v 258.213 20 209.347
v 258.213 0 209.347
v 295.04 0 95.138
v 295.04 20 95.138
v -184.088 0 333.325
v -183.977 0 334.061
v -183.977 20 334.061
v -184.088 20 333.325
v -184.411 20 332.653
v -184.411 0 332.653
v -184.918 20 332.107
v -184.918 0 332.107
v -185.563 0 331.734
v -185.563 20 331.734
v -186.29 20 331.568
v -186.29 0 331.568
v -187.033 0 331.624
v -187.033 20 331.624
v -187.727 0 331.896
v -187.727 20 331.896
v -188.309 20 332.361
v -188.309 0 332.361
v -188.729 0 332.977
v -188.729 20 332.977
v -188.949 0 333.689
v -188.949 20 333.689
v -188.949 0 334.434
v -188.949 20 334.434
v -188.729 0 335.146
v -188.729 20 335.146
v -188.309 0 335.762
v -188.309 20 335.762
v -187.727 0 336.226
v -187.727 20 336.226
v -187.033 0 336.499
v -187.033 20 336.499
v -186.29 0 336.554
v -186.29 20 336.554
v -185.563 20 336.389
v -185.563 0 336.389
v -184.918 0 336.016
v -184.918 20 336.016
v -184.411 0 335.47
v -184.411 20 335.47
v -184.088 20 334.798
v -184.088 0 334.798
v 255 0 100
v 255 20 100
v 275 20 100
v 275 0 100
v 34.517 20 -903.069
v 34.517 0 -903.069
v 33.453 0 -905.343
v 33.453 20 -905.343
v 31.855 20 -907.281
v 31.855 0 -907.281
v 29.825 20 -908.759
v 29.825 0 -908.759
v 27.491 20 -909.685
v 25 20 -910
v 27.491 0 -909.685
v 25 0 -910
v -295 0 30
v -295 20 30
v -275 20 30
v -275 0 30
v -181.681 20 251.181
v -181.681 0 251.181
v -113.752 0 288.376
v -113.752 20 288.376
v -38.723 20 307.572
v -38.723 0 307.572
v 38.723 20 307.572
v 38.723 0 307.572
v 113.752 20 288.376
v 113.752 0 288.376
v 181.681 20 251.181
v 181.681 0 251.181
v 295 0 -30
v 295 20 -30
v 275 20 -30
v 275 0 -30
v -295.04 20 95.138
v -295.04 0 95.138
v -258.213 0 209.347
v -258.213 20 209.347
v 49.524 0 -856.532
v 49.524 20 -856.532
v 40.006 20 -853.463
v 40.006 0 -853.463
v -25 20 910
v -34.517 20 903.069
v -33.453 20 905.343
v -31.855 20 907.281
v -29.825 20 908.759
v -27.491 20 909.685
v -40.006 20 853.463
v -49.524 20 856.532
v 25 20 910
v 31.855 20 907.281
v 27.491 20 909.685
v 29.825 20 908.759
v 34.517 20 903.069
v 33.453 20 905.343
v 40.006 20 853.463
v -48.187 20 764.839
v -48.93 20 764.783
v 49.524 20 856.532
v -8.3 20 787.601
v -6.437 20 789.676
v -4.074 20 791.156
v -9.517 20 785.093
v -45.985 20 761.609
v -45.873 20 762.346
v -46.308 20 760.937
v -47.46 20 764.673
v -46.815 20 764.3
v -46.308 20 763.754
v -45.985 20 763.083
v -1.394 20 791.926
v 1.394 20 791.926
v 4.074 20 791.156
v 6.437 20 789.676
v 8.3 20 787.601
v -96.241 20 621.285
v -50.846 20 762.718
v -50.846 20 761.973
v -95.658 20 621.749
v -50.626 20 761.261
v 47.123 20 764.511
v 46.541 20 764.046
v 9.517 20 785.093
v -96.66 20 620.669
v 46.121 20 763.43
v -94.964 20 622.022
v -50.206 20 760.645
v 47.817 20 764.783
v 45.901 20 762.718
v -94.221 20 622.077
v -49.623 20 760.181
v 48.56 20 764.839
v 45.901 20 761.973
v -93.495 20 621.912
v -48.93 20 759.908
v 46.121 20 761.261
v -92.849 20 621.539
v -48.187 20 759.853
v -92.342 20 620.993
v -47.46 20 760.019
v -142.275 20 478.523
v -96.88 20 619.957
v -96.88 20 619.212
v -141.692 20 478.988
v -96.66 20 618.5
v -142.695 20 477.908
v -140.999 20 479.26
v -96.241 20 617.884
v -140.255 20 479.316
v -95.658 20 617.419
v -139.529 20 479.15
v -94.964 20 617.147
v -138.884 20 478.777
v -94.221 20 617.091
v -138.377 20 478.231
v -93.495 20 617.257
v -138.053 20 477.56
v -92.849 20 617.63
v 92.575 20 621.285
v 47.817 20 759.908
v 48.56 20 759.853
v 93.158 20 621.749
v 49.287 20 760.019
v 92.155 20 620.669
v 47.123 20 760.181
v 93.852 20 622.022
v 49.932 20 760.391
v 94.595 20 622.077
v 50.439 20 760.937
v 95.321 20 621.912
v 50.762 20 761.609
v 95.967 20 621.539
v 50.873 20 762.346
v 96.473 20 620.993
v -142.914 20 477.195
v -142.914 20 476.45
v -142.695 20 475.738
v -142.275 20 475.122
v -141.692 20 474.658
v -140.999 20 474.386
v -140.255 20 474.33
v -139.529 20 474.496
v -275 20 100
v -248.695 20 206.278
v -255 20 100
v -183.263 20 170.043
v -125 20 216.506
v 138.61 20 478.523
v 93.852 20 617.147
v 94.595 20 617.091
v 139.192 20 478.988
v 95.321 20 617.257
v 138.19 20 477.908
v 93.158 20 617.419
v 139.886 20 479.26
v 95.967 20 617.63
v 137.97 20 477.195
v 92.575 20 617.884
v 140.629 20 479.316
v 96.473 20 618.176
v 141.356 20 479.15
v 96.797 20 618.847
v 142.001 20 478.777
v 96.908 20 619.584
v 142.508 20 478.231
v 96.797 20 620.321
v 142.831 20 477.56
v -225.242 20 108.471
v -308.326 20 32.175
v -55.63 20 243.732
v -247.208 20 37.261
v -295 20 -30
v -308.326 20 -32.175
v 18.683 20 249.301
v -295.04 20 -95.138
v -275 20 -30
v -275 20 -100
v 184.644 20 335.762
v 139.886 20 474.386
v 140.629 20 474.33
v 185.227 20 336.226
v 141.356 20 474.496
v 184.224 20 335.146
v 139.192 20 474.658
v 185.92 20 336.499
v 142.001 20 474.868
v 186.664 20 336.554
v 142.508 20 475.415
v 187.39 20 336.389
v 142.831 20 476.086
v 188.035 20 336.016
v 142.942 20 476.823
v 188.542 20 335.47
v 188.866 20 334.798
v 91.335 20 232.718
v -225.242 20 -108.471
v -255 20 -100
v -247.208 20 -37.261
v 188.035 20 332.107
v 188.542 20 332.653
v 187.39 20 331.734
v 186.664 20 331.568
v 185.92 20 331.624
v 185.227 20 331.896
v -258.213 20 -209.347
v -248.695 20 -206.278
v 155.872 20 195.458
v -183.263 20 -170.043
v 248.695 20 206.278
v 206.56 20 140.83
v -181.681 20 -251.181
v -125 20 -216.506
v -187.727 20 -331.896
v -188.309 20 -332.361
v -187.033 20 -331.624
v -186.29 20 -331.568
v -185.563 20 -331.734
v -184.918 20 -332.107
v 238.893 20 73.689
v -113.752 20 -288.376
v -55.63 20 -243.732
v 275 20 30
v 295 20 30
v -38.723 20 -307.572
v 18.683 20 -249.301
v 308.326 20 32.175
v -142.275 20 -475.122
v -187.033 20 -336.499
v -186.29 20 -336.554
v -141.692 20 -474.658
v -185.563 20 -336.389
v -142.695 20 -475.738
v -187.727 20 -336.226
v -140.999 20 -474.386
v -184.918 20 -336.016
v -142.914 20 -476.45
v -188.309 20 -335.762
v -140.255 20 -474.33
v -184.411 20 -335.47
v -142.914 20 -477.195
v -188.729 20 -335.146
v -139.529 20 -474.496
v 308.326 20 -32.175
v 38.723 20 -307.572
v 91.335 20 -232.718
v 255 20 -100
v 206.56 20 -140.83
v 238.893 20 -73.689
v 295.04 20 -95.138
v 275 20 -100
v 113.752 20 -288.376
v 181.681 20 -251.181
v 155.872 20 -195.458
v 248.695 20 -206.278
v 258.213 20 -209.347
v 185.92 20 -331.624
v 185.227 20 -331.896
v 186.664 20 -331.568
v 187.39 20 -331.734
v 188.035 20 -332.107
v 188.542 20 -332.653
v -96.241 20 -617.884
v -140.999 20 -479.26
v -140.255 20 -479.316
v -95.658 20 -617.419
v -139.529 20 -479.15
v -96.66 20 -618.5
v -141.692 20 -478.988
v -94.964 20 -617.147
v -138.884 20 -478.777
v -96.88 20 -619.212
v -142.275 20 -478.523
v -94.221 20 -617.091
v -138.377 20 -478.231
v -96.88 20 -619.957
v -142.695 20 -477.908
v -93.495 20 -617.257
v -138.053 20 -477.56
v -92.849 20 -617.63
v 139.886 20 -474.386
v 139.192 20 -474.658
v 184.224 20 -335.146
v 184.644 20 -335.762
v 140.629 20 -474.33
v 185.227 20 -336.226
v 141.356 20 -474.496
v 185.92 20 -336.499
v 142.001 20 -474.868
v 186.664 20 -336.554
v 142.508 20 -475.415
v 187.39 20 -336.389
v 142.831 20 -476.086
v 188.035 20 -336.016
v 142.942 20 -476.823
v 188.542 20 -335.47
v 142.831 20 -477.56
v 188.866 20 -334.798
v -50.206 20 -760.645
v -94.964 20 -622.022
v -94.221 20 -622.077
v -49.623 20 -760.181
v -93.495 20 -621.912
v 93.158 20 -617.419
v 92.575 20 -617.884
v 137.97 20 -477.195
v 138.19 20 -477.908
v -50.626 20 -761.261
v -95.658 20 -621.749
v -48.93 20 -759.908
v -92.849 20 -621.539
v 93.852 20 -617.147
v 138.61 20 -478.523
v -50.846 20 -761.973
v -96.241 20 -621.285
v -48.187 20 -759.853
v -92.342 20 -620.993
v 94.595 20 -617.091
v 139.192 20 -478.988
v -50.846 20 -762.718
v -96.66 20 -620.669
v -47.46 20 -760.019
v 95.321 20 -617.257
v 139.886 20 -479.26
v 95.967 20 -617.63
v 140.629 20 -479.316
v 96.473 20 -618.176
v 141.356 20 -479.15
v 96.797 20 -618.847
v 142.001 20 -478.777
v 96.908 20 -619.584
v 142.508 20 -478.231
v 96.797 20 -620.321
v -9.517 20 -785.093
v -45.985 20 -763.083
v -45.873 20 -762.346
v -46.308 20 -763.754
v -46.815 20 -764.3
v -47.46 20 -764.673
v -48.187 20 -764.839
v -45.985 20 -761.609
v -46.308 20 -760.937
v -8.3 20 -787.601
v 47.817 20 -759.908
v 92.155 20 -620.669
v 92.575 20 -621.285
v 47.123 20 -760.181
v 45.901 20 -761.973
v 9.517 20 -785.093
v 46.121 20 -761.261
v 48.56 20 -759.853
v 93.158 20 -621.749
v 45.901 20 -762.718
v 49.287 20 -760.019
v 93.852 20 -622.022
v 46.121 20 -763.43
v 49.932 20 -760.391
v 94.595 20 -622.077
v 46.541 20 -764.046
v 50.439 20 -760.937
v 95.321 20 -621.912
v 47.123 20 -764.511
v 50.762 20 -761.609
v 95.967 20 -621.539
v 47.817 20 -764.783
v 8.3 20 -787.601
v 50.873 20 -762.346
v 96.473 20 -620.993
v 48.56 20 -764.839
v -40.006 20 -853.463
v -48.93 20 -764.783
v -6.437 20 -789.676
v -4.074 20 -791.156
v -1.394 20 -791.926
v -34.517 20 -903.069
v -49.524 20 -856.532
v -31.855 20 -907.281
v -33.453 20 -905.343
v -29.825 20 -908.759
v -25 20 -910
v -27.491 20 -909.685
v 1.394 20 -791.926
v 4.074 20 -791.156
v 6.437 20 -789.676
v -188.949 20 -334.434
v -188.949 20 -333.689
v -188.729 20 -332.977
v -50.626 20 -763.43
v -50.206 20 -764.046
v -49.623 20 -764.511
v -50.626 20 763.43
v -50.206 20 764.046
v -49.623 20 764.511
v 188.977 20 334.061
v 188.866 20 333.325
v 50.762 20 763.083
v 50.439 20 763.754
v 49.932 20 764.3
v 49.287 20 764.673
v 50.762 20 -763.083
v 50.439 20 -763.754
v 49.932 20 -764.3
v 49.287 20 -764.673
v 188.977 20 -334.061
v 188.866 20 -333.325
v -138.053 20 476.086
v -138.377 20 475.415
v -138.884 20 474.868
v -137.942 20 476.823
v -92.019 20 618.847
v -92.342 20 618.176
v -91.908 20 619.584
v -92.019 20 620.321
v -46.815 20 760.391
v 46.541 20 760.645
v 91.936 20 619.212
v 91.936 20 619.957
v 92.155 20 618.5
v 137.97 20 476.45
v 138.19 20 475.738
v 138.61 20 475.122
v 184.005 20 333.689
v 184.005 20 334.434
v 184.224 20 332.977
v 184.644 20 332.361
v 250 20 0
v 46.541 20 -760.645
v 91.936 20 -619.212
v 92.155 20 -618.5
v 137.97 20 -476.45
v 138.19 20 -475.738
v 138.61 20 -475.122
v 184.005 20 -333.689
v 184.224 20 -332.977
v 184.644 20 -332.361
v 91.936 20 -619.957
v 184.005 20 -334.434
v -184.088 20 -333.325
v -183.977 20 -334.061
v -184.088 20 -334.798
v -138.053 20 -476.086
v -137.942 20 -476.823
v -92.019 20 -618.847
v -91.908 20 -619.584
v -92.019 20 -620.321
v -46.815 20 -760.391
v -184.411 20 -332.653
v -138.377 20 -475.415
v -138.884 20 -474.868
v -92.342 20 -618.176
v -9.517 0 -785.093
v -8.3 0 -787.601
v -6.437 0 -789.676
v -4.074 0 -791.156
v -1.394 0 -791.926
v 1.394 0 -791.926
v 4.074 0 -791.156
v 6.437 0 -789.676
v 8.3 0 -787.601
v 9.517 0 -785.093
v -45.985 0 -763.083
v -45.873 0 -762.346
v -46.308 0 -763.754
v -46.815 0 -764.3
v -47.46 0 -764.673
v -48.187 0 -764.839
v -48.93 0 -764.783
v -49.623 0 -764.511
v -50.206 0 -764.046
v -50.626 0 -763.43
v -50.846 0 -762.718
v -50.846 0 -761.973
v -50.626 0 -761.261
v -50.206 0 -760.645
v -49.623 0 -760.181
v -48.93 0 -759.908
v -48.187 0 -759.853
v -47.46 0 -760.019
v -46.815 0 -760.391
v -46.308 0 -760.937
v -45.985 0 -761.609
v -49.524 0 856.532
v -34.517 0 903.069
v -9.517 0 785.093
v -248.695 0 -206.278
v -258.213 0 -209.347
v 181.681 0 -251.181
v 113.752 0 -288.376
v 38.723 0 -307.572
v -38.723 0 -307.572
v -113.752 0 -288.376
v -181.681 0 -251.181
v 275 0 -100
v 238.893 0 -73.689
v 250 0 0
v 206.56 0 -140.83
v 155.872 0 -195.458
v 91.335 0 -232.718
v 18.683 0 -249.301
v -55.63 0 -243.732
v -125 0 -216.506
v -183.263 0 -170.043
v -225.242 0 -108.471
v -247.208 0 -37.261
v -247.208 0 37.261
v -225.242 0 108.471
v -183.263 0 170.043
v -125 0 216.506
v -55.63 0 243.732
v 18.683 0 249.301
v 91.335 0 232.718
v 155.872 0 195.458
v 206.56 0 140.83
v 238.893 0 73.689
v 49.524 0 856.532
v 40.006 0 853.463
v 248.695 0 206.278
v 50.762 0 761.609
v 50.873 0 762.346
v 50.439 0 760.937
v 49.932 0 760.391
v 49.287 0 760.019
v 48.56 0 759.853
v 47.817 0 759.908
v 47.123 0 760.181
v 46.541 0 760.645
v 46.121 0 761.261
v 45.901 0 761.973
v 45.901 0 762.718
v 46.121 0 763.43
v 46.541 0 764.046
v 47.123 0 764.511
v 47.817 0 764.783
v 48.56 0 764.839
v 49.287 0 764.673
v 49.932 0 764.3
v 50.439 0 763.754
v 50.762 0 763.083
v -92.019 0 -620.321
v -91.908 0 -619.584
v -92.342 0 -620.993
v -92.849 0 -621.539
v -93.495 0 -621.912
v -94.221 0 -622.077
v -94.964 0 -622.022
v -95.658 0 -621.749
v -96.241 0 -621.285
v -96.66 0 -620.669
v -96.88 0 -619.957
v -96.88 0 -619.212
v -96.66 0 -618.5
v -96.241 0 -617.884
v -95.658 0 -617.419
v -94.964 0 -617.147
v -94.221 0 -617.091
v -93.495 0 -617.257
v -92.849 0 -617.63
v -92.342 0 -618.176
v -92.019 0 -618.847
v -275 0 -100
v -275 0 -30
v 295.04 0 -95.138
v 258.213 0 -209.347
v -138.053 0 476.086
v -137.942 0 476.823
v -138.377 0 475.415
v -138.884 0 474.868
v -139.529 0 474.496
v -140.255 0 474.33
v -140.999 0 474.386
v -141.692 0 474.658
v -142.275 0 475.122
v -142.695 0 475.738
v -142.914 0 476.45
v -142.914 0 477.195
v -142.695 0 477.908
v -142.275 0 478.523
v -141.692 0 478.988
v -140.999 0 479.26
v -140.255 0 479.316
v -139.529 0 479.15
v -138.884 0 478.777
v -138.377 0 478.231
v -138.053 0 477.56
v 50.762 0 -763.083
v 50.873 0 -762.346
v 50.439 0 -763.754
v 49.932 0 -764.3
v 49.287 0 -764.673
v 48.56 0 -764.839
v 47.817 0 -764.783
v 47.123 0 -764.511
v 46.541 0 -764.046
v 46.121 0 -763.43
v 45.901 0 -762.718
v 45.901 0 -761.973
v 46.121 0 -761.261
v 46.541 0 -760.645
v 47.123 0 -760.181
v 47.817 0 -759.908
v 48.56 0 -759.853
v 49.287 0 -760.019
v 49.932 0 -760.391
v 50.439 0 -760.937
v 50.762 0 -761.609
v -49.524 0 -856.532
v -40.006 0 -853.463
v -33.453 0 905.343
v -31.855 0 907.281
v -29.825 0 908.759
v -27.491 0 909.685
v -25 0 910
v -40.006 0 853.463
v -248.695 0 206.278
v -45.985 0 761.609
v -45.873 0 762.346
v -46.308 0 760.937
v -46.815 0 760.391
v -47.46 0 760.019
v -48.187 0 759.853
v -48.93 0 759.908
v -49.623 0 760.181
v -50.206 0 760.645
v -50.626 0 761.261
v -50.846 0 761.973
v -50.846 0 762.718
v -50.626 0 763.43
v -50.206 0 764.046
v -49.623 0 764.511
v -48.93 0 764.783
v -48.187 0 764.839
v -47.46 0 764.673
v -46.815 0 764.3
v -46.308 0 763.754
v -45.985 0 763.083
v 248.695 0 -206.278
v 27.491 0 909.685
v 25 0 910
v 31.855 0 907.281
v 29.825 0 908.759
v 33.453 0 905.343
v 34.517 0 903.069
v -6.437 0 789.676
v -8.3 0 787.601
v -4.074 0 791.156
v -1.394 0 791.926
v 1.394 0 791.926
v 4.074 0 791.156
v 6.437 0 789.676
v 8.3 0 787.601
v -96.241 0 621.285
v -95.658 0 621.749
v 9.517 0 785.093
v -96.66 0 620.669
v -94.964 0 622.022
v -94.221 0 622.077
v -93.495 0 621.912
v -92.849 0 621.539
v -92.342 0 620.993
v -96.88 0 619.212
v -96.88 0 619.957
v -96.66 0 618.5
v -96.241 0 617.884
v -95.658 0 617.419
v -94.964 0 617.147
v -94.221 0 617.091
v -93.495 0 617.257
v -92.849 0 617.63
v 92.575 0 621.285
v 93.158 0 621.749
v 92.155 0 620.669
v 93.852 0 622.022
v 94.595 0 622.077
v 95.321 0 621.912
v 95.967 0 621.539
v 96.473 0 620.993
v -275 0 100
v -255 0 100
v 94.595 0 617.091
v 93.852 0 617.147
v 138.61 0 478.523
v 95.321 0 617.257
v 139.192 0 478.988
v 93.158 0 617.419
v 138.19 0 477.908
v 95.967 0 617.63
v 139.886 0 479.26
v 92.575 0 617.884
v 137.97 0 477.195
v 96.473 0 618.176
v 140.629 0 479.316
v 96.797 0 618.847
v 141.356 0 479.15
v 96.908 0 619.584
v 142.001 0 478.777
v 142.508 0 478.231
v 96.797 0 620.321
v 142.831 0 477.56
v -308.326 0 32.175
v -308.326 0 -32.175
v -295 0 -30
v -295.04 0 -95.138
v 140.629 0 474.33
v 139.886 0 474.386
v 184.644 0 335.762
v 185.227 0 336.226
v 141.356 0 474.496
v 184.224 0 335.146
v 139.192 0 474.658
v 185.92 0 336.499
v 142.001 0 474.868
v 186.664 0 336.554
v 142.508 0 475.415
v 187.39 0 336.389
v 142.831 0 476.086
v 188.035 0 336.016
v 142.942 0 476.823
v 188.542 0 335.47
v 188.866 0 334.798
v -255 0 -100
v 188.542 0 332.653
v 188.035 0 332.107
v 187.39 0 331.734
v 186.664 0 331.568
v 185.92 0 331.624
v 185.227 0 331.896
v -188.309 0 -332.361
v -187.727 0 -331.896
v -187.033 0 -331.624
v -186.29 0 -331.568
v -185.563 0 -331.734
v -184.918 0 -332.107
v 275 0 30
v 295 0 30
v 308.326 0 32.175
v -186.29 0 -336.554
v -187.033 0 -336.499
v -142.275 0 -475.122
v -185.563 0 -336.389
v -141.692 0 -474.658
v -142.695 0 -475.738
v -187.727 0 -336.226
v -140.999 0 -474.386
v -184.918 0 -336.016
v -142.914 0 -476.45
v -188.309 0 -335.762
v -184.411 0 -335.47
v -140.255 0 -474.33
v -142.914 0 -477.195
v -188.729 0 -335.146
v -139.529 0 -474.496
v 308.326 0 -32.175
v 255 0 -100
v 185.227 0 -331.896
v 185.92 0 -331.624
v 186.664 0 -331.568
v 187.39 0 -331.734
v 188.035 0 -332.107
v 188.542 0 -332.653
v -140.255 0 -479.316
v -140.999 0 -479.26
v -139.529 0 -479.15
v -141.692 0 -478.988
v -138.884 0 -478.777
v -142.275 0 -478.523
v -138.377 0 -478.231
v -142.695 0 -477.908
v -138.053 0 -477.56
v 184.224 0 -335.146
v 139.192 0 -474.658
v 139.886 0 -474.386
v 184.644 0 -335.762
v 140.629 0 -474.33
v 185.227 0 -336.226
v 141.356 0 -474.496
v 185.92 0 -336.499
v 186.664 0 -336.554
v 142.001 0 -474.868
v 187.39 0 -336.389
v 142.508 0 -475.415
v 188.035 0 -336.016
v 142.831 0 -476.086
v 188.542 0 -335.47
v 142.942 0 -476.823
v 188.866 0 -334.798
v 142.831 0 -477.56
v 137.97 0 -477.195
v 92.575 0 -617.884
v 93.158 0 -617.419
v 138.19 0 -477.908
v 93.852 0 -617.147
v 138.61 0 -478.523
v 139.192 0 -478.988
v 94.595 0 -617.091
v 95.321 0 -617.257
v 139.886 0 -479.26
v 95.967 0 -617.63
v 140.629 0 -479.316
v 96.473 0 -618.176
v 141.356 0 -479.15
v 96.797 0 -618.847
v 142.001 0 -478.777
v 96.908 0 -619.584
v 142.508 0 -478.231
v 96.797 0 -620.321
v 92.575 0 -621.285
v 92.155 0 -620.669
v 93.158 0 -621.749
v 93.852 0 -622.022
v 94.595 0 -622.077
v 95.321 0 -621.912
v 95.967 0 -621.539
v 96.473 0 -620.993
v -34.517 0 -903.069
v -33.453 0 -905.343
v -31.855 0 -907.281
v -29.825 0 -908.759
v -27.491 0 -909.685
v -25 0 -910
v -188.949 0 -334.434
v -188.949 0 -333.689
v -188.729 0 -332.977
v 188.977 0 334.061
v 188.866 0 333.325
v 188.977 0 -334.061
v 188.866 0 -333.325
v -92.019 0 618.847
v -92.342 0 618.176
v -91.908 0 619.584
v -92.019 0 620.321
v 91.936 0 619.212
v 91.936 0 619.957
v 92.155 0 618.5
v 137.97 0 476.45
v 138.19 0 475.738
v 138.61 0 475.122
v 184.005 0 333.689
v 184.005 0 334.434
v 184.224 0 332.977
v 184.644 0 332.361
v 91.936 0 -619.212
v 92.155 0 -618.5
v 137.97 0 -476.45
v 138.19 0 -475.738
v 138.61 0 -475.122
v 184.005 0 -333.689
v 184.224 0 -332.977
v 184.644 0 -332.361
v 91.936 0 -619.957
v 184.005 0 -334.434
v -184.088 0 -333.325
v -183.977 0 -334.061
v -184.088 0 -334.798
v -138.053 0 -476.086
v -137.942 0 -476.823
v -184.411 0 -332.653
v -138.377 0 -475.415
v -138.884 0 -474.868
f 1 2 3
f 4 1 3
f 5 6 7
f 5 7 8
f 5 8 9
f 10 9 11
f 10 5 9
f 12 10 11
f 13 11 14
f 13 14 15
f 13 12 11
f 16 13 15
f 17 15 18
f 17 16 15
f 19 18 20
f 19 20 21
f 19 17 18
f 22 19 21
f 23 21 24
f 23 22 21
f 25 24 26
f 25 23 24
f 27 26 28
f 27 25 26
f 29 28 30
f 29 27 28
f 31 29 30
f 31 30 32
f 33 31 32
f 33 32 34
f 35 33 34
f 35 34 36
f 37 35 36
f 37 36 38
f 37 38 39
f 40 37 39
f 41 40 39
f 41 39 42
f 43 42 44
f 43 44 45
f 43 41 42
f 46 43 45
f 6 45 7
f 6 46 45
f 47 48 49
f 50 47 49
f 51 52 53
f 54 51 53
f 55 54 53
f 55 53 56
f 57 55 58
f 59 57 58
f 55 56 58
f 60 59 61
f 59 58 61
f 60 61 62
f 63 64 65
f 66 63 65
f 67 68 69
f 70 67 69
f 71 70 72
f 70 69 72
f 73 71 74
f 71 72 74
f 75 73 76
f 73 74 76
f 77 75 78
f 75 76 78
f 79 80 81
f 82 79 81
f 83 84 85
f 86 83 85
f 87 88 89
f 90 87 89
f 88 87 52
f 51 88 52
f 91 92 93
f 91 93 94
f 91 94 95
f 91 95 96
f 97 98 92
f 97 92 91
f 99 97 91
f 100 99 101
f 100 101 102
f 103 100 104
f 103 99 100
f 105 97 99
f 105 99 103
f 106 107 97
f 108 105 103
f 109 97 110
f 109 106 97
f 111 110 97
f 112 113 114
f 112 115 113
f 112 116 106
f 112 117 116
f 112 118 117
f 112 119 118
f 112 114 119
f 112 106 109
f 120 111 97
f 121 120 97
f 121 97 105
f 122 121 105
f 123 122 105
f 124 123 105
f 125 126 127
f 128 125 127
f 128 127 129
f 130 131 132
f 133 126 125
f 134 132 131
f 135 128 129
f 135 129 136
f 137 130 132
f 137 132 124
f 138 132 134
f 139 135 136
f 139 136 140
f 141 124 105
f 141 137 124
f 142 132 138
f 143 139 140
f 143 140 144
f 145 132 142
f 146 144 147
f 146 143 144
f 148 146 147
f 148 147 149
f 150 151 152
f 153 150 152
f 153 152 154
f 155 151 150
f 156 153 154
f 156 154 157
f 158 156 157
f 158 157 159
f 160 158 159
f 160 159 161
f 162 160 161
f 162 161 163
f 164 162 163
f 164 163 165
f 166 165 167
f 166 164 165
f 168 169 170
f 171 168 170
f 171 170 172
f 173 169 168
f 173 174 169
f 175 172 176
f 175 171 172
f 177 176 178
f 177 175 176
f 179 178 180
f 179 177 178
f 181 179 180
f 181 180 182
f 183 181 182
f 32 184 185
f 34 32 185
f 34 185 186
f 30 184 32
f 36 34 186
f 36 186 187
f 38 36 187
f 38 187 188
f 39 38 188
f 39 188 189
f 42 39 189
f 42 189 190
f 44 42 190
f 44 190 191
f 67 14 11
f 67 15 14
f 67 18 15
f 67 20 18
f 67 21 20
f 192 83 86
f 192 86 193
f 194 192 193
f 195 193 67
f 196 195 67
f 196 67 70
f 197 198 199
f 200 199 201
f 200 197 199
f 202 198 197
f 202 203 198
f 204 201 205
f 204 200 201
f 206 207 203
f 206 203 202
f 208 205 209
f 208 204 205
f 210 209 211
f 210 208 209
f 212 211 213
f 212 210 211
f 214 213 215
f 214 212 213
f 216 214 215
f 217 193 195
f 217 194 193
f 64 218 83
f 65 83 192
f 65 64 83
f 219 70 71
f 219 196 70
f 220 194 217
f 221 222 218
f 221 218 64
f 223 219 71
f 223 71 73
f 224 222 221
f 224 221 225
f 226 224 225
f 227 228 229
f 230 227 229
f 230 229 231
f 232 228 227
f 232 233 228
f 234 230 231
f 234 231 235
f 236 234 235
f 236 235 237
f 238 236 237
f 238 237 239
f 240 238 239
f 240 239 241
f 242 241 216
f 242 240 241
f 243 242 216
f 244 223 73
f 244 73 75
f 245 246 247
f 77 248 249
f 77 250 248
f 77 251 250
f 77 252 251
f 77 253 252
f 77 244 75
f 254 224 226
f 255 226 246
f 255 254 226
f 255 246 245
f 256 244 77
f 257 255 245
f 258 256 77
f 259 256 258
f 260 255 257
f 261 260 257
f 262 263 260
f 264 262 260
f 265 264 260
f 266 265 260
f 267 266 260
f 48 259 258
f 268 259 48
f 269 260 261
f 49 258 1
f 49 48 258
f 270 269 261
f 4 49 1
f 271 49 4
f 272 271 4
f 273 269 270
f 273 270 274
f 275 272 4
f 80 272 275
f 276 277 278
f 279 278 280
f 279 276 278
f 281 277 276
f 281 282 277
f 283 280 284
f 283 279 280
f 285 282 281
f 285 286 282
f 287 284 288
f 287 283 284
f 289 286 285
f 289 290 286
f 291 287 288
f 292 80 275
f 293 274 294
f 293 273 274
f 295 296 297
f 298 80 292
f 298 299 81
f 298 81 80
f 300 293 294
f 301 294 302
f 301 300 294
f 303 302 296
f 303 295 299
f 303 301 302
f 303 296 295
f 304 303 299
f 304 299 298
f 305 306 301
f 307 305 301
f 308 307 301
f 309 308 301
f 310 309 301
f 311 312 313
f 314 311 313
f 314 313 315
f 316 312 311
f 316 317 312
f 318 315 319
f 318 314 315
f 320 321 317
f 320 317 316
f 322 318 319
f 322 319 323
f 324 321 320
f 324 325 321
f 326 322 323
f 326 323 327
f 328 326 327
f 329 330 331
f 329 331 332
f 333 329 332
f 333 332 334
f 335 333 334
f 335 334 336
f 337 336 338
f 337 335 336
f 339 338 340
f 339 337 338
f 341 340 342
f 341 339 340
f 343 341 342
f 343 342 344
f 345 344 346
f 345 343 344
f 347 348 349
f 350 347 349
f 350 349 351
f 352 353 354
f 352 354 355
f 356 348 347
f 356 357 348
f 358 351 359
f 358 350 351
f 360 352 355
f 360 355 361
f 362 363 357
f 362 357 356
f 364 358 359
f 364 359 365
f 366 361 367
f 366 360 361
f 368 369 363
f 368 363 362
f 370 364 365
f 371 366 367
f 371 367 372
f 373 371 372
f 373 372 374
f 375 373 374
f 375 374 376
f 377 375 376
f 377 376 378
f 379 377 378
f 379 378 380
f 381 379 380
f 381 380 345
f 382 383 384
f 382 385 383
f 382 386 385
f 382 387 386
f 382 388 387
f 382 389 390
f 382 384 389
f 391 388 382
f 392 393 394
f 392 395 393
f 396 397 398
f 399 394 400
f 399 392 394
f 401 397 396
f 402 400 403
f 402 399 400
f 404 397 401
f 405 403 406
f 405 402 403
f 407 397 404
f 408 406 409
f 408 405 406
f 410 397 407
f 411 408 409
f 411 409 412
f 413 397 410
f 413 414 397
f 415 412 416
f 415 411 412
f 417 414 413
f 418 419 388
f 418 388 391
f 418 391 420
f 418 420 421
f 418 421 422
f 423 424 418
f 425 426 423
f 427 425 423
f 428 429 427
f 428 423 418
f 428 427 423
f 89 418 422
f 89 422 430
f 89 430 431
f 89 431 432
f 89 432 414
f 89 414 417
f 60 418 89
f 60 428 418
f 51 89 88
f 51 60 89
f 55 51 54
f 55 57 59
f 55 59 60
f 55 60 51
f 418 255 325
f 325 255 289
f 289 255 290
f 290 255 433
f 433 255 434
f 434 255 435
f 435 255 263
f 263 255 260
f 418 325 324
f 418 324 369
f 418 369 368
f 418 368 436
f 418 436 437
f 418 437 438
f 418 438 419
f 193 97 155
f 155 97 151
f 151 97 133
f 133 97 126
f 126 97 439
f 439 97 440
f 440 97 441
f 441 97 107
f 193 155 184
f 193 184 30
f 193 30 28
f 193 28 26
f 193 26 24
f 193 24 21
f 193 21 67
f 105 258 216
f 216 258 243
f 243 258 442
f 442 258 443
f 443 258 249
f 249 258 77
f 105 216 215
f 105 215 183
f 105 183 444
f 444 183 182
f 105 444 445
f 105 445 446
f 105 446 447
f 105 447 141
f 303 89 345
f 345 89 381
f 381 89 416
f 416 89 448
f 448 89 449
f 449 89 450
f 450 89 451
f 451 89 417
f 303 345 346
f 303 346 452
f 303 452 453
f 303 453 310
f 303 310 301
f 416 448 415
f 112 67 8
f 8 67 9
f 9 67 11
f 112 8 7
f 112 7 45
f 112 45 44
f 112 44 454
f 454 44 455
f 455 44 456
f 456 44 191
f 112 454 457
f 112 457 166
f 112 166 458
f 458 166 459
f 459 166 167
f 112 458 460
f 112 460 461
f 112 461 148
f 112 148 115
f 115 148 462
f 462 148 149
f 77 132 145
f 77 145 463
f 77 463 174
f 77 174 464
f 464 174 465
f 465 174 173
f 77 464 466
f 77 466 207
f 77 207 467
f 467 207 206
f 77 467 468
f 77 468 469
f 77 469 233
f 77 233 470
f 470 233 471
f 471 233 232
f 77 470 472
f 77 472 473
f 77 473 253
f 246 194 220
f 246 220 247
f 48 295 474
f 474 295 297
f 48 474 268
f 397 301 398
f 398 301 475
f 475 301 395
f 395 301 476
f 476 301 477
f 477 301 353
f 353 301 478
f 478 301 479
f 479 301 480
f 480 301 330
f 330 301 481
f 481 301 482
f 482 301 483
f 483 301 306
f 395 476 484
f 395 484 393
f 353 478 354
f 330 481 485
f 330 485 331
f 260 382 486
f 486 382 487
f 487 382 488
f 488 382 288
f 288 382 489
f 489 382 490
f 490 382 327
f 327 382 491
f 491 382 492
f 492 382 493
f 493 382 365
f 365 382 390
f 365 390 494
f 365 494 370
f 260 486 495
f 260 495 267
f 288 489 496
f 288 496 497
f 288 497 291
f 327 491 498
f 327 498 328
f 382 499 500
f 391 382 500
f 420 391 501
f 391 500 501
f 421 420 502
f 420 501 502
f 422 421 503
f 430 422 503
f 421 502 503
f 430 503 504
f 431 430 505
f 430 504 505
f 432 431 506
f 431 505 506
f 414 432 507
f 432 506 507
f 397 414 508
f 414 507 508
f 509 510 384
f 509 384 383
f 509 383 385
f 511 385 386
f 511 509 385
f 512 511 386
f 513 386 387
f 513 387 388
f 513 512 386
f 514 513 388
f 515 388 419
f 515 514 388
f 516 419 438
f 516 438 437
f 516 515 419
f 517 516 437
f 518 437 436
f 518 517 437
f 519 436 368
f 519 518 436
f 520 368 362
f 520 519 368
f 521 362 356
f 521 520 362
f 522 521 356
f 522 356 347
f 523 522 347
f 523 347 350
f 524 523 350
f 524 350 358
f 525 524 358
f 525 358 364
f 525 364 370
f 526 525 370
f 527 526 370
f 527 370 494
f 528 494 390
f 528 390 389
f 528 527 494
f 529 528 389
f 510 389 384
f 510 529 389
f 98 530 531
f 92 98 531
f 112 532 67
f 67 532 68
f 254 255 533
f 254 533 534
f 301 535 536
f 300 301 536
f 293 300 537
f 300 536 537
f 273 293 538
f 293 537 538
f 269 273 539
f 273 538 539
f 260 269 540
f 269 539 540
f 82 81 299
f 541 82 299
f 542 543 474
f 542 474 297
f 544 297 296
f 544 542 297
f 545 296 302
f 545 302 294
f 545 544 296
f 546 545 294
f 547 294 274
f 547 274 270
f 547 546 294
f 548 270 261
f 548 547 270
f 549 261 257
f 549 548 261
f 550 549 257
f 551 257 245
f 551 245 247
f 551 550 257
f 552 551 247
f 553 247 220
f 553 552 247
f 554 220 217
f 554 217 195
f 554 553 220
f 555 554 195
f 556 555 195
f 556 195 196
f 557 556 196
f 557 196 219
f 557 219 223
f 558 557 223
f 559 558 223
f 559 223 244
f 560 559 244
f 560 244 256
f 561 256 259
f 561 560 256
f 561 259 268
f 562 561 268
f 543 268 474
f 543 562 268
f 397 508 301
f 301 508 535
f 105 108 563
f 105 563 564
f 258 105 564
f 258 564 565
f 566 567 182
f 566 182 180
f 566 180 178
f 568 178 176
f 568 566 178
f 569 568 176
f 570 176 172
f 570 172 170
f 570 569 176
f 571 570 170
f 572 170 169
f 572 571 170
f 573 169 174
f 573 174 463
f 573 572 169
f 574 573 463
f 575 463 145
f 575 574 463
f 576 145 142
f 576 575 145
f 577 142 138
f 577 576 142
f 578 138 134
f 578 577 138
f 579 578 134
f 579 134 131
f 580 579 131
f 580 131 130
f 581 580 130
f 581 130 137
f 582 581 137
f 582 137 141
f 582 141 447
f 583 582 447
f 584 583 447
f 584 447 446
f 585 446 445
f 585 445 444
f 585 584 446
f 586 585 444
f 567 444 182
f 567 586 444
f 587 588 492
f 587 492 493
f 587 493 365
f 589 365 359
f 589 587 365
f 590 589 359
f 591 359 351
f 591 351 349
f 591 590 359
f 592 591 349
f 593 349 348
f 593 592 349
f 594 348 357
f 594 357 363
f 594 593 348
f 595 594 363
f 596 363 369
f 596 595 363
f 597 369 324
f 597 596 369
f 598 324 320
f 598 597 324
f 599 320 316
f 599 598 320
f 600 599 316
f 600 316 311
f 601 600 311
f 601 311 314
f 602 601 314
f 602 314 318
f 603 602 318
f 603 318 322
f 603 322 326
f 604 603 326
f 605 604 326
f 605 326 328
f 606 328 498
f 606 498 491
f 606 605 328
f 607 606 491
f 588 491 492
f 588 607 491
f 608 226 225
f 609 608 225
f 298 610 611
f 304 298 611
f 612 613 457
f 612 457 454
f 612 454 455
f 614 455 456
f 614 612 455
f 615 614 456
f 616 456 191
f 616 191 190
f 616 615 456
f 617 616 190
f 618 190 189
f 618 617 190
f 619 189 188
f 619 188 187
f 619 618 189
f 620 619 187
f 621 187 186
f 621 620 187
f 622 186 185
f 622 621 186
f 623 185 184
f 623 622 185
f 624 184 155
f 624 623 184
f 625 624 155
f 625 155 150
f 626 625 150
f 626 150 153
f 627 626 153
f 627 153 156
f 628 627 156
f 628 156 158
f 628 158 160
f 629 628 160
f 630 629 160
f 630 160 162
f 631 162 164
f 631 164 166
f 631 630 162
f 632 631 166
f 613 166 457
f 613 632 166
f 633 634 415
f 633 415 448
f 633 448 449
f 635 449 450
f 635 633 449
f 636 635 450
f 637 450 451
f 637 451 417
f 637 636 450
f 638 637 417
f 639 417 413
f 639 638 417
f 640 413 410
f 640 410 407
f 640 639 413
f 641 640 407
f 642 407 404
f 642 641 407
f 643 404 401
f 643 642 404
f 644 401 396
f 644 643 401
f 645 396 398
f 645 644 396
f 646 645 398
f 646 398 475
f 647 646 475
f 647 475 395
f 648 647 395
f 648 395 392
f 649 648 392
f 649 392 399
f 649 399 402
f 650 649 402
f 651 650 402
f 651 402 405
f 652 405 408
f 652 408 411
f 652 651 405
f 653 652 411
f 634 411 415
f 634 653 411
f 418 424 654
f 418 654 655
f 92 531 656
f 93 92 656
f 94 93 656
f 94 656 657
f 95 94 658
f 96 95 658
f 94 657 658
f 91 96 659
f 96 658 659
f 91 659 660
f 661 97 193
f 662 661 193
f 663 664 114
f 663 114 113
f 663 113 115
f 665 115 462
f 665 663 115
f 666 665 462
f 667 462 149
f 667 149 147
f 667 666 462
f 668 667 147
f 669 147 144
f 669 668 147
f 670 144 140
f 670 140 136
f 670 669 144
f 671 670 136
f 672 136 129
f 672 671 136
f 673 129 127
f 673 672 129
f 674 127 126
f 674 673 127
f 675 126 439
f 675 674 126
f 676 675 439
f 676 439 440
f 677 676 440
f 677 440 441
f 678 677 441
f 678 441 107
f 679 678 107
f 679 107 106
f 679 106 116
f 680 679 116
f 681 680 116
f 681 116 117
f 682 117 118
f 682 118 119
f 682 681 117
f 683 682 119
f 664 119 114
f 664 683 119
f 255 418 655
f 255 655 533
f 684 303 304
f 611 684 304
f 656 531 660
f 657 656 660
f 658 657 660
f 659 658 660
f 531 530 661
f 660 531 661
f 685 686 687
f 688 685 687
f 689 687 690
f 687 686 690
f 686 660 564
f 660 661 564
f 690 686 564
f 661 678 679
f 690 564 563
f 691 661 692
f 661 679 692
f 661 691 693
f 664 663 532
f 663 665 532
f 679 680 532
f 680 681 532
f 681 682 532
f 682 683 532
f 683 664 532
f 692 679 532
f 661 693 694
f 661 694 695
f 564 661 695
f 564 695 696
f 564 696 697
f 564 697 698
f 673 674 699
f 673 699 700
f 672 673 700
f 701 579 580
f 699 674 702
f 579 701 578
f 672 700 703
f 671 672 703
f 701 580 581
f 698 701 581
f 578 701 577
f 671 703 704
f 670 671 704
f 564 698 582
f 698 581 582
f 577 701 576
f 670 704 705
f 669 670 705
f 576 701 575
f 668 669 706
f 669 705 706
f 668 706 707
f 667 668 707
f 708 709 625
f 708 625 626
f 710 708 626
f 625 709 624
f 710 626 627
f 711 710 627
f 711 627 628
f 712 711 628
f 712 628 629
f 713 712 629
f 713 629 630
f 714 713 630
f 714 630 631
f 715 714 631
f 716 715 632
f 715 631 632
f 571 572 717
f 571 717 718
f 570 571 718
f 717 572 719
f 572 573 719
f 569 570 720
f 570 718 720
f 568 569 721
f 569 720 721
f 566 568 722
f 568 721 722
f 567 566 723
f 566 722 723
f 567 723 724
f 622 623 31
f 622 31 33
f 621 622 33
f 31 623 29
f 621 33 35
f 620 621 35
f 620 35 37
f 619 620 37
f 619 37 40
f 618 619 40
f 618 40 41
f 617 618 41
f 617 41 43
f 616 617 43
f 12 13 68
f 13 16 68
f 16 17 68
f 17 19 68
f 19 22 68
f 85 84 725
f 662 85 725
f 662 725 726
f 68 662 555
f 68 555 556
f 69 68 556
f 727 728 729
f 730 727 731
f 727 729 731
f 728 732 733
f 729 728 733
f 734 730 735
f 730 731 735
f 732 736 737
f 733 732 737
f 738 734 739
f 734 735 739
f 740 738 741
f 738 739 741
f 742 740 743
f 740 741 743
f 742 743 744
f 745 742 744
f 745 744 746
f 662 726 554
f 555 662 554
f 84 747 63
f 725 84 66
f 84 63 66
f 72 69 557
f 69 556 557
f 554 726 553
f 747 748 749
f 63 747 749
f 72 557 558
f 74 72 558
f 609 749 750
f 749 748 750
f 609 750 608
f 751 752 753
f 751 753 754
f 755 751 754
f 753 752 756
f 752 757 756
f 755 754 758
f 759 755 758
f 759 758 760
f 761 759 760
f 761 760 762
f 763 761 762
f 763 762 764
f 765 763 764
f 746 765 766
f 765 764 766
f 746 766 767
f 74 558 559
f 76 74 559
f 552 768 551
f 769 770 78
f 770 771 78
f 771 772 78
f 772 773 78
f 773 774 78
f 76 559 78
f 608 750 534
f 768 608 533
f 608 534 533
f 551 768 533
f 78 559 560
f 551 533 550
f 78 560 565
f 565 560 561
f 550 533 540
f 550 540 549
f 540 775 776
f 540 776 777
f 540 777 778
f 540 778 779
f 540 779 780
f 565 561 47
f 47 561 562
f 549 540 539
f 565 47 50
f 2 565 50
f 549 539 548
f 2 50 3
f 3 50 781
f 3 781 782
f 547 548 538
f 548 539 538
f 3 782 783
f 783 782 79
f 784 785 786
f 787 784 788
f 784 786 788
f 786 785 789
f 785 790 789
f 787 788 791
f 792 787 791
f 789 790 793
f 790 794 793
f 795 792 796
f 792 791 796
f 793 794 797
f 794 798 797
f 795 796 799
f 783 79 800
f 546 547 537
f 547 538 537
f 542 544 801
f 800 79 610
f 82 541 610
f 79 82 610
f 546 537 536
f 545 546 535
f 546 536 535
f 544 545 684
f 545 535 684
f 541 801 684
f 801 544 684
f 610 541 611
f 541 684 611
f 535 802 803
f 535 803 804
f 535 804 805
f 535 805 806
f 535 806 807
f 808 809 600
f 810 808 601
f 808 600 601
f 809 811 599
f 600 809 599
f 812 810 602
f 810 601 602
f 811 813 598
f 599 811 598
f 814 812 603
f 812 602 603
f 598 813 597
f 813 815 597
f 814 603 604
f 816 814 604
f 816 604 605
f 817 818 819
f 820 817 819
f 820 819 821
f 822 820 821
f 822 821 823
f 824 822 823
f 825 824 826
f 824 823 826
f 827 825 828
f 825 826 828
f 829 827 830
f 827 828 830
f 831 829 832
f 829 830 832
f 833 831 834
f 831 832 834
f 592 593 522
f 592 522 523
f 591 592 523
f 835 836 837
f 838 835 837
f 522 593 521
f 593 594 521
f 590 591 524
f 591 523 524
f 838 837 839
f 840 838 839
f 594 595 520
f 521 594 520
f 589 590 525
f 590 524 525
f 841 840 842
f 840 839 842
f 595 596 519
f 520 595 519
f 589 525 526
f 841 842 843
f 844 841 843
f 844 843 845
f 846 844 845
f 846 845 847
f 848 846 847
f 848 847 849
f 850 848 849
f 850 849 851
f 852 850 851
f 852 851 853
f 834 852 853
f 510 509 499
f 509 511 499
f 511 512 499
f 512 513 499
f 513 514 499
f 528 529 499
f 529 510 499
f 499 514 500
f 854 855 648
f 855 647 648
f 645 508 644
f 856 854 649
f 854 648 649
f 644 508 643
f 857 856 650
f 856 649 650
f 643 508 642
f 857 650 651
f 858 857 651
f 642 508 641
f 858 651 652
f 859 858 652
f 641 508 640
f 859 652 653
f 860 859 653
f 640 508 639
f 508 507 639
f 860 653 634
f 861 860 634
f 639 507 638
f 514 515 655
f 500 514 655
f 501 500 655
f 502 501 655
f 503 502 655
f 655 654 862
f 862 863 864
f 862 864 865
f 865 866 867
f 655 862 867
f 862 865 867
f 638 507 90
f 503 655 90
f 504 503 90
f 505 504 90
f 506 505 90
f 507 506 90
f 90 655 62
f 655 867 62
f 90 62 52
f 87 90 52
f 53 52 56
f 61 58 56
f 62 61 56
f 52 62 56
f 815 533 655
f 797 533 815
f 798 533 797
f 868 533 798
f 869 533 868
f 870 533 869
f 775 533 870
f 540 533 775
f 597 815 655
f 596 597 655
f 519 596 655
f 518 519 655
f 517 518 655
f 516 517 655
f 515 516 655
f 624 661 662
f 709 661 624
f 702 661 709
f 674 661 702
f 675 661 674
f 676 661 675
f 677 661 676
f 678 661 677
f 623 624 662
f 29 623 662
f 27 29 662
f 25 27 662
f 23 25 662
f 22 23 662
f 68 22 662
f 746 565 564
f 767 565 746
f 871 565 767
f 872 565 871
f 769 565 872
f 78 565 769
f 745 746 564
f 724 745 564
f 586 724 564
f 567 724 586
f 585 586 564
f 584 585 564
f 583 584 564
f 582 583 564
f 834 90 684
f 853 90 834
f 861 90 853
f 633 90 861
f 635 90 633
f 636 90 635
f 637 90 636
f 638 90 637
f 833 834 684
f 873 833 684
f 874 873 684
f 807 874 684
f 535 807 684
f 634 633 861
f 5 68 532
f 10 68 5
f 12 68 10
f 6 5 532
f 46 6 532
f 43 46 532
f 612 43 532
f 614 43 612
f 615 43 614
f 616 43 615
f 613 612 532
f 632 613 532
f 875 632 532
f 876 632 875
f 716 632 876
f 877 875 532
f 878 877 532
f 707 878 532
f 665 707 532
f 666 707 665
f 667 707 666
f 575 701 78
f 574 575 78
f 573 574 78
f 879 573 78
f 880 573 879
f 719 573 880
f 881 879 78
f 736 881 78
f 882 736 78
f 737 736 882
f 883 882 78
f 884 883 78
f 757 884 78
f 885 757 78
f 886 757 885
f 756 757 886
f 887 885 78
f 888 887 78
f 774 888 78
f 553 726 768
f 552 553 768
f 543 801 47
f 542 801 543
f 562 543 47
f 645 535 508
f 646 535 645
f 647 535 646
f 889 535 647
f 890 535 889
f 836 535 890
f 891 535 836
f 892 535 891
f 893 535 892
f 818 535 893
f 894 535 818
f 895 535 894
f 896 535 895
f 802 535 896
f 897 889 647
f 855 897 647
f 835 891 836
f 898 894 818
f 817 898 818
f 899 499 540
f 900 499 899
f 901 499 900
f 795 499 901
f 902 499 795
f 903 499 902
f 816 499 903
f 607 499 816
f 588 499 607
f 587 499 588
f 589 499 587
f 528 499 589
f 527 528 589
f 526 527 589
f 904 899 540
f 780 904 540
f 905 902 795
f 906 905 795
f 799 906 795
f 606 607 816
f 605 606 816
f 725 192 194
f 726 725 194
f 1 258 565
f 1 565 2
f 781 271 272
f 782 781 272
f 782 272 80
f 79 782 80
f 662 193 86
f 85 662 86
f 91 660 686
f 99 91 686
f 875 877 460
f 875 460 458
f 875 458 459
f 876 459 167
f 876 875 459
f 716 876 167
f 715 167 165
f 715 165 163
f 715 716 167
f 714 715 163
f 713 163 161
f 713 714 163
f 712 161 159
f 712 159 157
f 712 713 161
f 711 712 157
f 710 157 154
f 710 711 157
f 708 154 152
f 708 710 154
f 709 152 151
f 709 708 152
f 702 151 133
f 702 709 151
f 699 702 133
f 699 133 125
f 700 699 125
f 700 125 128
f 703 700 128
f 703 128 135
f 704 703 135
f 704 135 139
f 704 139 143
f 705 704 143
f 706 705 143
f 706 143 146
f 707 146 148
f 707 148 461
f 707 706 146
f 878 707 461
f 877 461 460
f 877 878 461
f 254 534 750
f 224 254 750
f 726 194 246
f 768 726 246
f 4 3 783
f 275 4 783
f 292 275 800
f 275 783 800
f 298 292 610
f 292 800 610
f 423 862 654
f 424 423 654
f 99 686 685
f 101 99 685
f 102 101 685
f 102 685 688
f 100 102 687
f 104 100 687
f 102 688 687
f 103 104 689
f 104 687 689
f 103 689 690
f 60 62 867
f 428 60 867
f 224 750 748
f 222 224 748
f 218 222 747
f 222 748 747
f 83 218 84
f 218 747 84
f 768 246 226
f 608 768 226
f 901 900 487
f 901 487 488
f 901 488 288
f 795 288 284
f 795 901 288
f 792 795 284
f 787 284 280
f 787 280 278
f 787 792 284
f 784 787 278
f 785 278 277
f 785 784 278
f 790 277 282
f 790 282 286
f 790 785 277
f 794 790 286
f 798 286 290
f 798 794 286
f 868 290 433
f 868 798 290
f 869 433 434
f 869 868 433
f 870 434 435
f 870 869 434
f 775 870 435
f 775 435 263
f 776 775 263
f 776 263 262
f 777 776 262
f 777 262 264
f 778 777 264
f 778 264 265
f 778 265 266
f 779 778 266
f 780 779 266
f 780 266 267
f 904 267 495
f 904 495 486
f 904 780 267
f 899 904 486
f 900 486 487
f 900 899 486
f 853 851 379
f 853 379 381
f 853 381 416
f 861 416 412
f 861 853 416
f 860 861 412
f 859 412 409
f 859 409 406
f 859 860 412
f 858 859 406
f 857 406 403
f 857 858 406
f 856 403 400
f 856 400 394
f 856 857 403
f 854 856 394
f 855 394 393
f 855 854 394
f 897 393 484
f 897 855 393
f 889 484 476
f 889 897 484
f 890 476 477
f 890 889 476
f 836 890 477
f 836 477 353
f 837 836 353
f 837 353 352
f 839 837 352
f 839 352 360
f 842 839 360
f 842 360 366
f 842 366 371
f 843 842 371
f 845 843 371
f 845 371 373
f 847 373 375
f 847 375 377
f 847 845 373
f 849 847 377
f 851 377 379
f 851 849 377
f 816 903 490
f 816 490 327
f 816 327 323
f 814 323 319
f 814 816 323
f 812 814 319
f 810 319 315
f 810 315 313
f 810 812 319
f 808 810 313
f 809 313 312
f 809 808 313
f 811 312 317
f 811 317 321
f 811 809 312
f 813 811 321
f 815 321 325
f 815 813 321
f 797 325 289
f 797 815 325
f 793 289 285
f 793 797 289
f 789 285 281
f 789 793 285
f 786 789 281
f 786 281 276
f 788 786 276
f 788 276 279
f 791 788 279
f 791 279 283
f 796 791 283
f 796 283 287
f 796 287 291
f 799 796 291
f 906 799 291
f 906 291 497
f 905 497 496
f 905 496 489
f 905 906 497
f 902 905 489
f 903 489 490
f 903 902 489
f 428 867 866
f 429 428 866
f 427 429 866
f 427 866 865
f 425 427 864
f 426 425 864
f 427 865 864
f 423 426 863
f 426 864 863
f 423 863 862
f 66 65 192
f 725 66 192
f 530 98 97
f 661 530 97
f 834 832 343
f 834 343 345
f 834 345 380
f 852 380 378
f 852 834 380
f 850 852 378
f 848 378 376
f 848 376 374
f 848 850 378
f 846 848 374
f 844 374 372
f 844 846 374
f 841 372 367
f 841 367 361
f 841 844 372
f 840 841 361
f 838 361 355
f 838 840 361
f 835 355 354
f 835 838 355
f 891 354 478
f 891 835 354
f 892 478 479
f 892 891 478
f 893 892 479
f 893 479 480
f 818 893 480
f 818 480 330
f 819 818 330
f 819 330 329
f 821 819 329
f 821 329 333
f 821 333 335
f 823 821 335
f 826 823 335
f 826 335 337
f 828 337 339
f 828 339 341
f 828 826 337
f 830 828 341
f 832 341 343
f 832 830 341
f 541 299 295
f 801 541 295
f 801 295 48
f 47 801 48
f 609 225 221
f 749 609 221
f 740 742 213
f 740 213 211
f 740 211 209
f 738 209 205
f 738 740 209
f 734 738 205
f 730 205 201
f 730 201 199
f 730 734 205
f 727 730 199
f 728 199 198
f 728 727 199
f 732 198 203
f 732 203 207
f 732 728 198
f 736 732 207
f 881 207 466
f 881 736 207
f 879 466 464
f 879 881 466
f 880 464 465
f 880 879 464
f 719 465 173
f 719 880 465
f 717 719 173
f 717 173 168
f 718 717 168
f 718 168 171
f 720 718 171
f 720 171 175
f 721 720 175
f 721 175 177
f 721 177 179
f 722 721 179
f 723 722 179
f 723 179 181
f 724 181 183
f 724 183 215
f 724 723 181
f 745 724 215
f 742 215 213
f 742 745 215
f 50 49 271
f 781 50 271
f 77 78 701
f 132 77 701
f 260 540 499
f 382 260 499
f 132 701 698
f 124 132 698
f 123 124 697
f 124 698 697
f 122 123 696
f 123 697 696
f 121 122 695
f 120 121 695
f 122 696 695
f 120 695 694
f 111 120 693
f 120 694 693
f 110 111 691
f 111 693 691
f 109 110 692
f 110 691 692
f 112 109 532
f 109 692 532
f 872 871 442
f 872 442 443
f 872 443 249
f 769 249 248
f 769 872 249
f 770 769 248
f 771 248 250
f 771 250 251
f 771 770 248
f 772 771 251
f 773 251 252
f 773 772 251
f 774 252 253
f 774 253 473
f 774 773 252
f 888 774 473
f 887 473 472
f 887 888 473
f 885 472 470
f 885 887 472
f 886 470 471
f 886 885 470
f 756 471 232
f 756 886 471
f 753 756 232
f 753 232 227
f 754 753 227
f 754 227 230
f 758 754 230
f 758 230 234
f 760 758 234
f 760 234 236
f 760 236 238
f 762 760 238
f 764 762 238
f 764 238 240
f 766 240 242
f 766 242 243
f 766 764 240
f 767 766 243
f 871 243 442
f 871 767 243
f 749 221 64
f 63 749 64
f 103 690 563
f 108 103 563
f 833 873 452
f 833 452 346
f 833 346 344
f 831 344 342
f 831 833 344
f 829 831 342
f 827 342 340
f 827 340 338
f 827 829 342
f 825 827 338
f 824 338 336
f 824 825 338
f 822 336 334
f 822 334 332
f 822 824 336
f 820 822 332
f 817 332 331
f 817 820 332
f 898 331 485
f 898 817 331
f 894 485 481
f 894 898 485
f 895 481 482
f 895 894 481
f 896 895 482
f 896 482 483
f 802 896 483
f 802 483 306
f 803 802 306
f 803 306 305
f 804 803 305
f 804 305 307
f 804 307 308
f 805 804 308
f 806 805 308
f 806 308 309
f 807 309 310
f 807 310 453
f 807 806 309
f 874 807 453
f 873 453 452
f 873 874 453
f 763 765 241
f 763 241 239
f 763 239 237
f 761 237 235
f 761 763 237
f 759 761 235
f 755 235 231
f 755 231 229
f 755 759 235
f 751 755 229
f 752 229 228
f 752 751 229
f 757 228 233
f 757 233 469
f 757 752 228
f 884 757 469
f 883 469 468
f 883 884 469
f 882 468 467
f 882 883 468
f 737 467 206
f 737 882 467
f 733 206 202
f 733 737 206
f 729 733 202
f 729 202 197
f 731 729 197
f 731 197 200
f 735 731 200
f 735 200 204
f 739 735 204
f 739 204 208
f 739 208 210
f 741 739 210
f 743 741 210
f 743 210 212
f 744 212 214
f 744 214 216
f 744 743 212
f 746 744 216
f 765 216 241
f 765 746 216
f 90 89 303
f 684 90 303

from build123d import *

# Parameters (mm, degrees)
SKETCH2_R           = 2.5
SKETCH2_R_2         = 250
BOSS_EXTRUDE1_DEPTH = 20
CUT_EXTRUDE4_DEPTH  = 21
CUT_EXTRUDE5_DEPTH  = 21


with BuildPart() as part:
    # Sketch2 → Boss-Extrude1 (new body)
    with BuildSketch(Plane(origin=(0, 0, 0), x_dir=(1, 0, 0), z_dir=(0, 1, 0))):
        with BuildLine():
            Line((-34.517430478, 903.068960265), (-295.040344804, 95.1377682))
            ThreePointArc((-295.040344804, 95.1377682), (-310, 0), (-295.040344804, -95.1377682))
            Line((-295.040344804, -95.1377682), (-34.517430478, -903.068960265))
            ThreePointArc((-34.517430478, -903.068960265), (-30.886866626, -908.083613135), (-25, -910))
            Line((-25, -910), (25, -910))
            ThreePointArc((25, -910), (30.886866626, -908.083613135), (34.517430478, -903.068960265))
            Line((34.517430478, -903.068960265), (295.040344804, -95.1377682))
            ThreePointArc((295.040344804, -95.1377682), (310, 0), (295.040344804, 95.1377682))
            Line((295.040344804, 95.1377682), (34.517430478, 903.068960265))
            ThreePointArc((34.517430478, 903.068960265), (30.886866626, 908.083613135), (25, 910))
            Line((25, 910), (-25, 910))
            ThreePointArc((-25, 910), (-30.886866626, 908.083613135), (-34.517430478, 903.068960265))
        make_face()
        with Locations((-48.373467006, -762.345774842)):
            Circle(SKETCH2_R, mode=Mode.SUBTRACT)
        with Locations((-94.407870974, -619.584317679)):
            Circle(SKETCH2_R, mode=Mode.SUBTRACT)
        with Locations((-140.442274942, -476.822860516)):
            Circle(SKETCH2_R, mode=Mode.SUBTRACT)
        with BuildLine():
            ThreePointArc((-181.680791071, -251.181388952), (0, -310), (181.680791071, -251.181388952))
            Line((181.680791071, -251.181388952), (9.517430478, -785.092770658))
            ThreePointArc((9.517430478, -785.092770658), (0, -792.023810393), (-9.517430478, -785.092770658))
            Line((-9.517430478, -785.092770658), (-181.680791071, -251.181388952))
        make_face(mode=Mode.SUBTRACT)
        with Locations((-186.476678909, -334.061403353)):
            Circle(SKETCH2_R, mode=Mode.SUBTRACT)
        with Locations((48.373467006, -762.345774842)):
            Circle(SKETCH2_R, mode=Mode.SUBTRACT)
        with Locations((94.407870974, -619.584317679)):
            Circle(SKETCH2_R, mode=Mode.SUBTRACT)
        with Locations((140.442274942, -476.822860516)):
            Circle(SKETCH2_R, mode=Mode.SUBTRACT)
        with Locations((186.476678909, -334.061403353)):
            Circle(SKETCH2_R, mode=Mode.SUBTRACT)
        with Locations((-186.476678909, 334.061403353)):
            Circle(SKETCH2_R, mode=Mode.SUBTRACT)
        with Locations((-140.442274942, 476.822860516)):
            Circle(SKETCH2_R, mode=Mode.SUBTRACT)
        with Locations((-94.407870974, 619.584317679)):
            Circle(SKETCH2_R, mode=Mode.SUBTRACT)
        with BuildLine():
            ThreePointArc((181.680791071, 251.181388952), (0, 310), (-181.680791071, 251.181388952))
            Line((-181.680791071, 251.181388952), (-9.517430478, 785.092770658))
            ThreePointArc((-9.517430478, 785.092770658), (0, 792.023810393), (9.517430478, 785.092770658))
            Line((9.517430478, 785.092770658), (181.680791071, 251.181388952))
        make_face(mode=Mode.SUBTRACT)
        with Locations((-48.373467006, 762.345774842)):
            Circle(SKETCH2_R, mode=Mode.SUBTRACT)
        Circle(SKETCH2_R_2, mode=Mode.SUBTRACT)
        with Locations((186.476678909, 334.061403353)):
            Circle(SKETCH2_R, mode=Mode.SUBTRACT)
        with Locations((140.442274942, 476.822860516)):
            Circle(SKETCH2_R, mode=Mode.SUBTRACT)
        with Locations((94.407870974, 619.584317679)):
            Circle(SKETCH2_R, mode=Mode.SUBTRACT)
        with Locations((48.373467006, 762.345774842)):
            Circle(SKETCH2_R, mode=Mode.SUBTRACT)
    extrude(amount=BOSS_EXTRUDE1_DEPTH)

    # Sketch3 → Cut-Extrude4 (cut, through all)
    with BuildSketch(Plane(origin=(0, 20, 0), x_dir=(1, 0, 0), z_dir=(0, 1, 0))):
        Polygon((-49.523523643, -856.532206403), (-40.006093165, -853.463246139), (-248.695391152, -206.277973666), (-258.21282163, -209.34693393), align=None)
        Polygon((-49.523523643, 856.532206403), (-40.006093165, 853.463246139), (-248.695391152, 206.277973666), (-258.21282163, 209.34693393), align=None)
        Polygon((49.523523643, 856.532206403), (40.006093165, 853.463246139), (248.695391152, 206.277973666), (258.21282163, 209.34693393), align=None)
        Polygon((49.523523643, -856.532206403), (40.006093165, -853.463246139), (248.695391152, -206.277973666), (258.21282163, -209.34693393), align=None)
    extrude(amount=-CUT_EXTRUDE4_DEPTH, mode=Mode.SUBTRACT)

    # Sketch4 → Cut-Extrude5 (cut, through all)
    with BuildSketch(Plane(origin=(0, 20, 0), x_dir=(1, 0, 0), z_dir=(0, 1, 0))):
        Polygon((-255, -100), (-255, 100), (-275, 100), (-275, 30), (-295, 30), (-295, -30), (-275, -30), (-275, -100), align=None)
        Polygon((255, -100), (275, -100), (275, -30), (295, -30), (295, 30), (275, 30), (275, 100), (255, 100), align=None)
    extrude(amount=-CUT_EXTRUDE5_DEPTH, mode=Mode.SUBTRACT)


solid = part.part
